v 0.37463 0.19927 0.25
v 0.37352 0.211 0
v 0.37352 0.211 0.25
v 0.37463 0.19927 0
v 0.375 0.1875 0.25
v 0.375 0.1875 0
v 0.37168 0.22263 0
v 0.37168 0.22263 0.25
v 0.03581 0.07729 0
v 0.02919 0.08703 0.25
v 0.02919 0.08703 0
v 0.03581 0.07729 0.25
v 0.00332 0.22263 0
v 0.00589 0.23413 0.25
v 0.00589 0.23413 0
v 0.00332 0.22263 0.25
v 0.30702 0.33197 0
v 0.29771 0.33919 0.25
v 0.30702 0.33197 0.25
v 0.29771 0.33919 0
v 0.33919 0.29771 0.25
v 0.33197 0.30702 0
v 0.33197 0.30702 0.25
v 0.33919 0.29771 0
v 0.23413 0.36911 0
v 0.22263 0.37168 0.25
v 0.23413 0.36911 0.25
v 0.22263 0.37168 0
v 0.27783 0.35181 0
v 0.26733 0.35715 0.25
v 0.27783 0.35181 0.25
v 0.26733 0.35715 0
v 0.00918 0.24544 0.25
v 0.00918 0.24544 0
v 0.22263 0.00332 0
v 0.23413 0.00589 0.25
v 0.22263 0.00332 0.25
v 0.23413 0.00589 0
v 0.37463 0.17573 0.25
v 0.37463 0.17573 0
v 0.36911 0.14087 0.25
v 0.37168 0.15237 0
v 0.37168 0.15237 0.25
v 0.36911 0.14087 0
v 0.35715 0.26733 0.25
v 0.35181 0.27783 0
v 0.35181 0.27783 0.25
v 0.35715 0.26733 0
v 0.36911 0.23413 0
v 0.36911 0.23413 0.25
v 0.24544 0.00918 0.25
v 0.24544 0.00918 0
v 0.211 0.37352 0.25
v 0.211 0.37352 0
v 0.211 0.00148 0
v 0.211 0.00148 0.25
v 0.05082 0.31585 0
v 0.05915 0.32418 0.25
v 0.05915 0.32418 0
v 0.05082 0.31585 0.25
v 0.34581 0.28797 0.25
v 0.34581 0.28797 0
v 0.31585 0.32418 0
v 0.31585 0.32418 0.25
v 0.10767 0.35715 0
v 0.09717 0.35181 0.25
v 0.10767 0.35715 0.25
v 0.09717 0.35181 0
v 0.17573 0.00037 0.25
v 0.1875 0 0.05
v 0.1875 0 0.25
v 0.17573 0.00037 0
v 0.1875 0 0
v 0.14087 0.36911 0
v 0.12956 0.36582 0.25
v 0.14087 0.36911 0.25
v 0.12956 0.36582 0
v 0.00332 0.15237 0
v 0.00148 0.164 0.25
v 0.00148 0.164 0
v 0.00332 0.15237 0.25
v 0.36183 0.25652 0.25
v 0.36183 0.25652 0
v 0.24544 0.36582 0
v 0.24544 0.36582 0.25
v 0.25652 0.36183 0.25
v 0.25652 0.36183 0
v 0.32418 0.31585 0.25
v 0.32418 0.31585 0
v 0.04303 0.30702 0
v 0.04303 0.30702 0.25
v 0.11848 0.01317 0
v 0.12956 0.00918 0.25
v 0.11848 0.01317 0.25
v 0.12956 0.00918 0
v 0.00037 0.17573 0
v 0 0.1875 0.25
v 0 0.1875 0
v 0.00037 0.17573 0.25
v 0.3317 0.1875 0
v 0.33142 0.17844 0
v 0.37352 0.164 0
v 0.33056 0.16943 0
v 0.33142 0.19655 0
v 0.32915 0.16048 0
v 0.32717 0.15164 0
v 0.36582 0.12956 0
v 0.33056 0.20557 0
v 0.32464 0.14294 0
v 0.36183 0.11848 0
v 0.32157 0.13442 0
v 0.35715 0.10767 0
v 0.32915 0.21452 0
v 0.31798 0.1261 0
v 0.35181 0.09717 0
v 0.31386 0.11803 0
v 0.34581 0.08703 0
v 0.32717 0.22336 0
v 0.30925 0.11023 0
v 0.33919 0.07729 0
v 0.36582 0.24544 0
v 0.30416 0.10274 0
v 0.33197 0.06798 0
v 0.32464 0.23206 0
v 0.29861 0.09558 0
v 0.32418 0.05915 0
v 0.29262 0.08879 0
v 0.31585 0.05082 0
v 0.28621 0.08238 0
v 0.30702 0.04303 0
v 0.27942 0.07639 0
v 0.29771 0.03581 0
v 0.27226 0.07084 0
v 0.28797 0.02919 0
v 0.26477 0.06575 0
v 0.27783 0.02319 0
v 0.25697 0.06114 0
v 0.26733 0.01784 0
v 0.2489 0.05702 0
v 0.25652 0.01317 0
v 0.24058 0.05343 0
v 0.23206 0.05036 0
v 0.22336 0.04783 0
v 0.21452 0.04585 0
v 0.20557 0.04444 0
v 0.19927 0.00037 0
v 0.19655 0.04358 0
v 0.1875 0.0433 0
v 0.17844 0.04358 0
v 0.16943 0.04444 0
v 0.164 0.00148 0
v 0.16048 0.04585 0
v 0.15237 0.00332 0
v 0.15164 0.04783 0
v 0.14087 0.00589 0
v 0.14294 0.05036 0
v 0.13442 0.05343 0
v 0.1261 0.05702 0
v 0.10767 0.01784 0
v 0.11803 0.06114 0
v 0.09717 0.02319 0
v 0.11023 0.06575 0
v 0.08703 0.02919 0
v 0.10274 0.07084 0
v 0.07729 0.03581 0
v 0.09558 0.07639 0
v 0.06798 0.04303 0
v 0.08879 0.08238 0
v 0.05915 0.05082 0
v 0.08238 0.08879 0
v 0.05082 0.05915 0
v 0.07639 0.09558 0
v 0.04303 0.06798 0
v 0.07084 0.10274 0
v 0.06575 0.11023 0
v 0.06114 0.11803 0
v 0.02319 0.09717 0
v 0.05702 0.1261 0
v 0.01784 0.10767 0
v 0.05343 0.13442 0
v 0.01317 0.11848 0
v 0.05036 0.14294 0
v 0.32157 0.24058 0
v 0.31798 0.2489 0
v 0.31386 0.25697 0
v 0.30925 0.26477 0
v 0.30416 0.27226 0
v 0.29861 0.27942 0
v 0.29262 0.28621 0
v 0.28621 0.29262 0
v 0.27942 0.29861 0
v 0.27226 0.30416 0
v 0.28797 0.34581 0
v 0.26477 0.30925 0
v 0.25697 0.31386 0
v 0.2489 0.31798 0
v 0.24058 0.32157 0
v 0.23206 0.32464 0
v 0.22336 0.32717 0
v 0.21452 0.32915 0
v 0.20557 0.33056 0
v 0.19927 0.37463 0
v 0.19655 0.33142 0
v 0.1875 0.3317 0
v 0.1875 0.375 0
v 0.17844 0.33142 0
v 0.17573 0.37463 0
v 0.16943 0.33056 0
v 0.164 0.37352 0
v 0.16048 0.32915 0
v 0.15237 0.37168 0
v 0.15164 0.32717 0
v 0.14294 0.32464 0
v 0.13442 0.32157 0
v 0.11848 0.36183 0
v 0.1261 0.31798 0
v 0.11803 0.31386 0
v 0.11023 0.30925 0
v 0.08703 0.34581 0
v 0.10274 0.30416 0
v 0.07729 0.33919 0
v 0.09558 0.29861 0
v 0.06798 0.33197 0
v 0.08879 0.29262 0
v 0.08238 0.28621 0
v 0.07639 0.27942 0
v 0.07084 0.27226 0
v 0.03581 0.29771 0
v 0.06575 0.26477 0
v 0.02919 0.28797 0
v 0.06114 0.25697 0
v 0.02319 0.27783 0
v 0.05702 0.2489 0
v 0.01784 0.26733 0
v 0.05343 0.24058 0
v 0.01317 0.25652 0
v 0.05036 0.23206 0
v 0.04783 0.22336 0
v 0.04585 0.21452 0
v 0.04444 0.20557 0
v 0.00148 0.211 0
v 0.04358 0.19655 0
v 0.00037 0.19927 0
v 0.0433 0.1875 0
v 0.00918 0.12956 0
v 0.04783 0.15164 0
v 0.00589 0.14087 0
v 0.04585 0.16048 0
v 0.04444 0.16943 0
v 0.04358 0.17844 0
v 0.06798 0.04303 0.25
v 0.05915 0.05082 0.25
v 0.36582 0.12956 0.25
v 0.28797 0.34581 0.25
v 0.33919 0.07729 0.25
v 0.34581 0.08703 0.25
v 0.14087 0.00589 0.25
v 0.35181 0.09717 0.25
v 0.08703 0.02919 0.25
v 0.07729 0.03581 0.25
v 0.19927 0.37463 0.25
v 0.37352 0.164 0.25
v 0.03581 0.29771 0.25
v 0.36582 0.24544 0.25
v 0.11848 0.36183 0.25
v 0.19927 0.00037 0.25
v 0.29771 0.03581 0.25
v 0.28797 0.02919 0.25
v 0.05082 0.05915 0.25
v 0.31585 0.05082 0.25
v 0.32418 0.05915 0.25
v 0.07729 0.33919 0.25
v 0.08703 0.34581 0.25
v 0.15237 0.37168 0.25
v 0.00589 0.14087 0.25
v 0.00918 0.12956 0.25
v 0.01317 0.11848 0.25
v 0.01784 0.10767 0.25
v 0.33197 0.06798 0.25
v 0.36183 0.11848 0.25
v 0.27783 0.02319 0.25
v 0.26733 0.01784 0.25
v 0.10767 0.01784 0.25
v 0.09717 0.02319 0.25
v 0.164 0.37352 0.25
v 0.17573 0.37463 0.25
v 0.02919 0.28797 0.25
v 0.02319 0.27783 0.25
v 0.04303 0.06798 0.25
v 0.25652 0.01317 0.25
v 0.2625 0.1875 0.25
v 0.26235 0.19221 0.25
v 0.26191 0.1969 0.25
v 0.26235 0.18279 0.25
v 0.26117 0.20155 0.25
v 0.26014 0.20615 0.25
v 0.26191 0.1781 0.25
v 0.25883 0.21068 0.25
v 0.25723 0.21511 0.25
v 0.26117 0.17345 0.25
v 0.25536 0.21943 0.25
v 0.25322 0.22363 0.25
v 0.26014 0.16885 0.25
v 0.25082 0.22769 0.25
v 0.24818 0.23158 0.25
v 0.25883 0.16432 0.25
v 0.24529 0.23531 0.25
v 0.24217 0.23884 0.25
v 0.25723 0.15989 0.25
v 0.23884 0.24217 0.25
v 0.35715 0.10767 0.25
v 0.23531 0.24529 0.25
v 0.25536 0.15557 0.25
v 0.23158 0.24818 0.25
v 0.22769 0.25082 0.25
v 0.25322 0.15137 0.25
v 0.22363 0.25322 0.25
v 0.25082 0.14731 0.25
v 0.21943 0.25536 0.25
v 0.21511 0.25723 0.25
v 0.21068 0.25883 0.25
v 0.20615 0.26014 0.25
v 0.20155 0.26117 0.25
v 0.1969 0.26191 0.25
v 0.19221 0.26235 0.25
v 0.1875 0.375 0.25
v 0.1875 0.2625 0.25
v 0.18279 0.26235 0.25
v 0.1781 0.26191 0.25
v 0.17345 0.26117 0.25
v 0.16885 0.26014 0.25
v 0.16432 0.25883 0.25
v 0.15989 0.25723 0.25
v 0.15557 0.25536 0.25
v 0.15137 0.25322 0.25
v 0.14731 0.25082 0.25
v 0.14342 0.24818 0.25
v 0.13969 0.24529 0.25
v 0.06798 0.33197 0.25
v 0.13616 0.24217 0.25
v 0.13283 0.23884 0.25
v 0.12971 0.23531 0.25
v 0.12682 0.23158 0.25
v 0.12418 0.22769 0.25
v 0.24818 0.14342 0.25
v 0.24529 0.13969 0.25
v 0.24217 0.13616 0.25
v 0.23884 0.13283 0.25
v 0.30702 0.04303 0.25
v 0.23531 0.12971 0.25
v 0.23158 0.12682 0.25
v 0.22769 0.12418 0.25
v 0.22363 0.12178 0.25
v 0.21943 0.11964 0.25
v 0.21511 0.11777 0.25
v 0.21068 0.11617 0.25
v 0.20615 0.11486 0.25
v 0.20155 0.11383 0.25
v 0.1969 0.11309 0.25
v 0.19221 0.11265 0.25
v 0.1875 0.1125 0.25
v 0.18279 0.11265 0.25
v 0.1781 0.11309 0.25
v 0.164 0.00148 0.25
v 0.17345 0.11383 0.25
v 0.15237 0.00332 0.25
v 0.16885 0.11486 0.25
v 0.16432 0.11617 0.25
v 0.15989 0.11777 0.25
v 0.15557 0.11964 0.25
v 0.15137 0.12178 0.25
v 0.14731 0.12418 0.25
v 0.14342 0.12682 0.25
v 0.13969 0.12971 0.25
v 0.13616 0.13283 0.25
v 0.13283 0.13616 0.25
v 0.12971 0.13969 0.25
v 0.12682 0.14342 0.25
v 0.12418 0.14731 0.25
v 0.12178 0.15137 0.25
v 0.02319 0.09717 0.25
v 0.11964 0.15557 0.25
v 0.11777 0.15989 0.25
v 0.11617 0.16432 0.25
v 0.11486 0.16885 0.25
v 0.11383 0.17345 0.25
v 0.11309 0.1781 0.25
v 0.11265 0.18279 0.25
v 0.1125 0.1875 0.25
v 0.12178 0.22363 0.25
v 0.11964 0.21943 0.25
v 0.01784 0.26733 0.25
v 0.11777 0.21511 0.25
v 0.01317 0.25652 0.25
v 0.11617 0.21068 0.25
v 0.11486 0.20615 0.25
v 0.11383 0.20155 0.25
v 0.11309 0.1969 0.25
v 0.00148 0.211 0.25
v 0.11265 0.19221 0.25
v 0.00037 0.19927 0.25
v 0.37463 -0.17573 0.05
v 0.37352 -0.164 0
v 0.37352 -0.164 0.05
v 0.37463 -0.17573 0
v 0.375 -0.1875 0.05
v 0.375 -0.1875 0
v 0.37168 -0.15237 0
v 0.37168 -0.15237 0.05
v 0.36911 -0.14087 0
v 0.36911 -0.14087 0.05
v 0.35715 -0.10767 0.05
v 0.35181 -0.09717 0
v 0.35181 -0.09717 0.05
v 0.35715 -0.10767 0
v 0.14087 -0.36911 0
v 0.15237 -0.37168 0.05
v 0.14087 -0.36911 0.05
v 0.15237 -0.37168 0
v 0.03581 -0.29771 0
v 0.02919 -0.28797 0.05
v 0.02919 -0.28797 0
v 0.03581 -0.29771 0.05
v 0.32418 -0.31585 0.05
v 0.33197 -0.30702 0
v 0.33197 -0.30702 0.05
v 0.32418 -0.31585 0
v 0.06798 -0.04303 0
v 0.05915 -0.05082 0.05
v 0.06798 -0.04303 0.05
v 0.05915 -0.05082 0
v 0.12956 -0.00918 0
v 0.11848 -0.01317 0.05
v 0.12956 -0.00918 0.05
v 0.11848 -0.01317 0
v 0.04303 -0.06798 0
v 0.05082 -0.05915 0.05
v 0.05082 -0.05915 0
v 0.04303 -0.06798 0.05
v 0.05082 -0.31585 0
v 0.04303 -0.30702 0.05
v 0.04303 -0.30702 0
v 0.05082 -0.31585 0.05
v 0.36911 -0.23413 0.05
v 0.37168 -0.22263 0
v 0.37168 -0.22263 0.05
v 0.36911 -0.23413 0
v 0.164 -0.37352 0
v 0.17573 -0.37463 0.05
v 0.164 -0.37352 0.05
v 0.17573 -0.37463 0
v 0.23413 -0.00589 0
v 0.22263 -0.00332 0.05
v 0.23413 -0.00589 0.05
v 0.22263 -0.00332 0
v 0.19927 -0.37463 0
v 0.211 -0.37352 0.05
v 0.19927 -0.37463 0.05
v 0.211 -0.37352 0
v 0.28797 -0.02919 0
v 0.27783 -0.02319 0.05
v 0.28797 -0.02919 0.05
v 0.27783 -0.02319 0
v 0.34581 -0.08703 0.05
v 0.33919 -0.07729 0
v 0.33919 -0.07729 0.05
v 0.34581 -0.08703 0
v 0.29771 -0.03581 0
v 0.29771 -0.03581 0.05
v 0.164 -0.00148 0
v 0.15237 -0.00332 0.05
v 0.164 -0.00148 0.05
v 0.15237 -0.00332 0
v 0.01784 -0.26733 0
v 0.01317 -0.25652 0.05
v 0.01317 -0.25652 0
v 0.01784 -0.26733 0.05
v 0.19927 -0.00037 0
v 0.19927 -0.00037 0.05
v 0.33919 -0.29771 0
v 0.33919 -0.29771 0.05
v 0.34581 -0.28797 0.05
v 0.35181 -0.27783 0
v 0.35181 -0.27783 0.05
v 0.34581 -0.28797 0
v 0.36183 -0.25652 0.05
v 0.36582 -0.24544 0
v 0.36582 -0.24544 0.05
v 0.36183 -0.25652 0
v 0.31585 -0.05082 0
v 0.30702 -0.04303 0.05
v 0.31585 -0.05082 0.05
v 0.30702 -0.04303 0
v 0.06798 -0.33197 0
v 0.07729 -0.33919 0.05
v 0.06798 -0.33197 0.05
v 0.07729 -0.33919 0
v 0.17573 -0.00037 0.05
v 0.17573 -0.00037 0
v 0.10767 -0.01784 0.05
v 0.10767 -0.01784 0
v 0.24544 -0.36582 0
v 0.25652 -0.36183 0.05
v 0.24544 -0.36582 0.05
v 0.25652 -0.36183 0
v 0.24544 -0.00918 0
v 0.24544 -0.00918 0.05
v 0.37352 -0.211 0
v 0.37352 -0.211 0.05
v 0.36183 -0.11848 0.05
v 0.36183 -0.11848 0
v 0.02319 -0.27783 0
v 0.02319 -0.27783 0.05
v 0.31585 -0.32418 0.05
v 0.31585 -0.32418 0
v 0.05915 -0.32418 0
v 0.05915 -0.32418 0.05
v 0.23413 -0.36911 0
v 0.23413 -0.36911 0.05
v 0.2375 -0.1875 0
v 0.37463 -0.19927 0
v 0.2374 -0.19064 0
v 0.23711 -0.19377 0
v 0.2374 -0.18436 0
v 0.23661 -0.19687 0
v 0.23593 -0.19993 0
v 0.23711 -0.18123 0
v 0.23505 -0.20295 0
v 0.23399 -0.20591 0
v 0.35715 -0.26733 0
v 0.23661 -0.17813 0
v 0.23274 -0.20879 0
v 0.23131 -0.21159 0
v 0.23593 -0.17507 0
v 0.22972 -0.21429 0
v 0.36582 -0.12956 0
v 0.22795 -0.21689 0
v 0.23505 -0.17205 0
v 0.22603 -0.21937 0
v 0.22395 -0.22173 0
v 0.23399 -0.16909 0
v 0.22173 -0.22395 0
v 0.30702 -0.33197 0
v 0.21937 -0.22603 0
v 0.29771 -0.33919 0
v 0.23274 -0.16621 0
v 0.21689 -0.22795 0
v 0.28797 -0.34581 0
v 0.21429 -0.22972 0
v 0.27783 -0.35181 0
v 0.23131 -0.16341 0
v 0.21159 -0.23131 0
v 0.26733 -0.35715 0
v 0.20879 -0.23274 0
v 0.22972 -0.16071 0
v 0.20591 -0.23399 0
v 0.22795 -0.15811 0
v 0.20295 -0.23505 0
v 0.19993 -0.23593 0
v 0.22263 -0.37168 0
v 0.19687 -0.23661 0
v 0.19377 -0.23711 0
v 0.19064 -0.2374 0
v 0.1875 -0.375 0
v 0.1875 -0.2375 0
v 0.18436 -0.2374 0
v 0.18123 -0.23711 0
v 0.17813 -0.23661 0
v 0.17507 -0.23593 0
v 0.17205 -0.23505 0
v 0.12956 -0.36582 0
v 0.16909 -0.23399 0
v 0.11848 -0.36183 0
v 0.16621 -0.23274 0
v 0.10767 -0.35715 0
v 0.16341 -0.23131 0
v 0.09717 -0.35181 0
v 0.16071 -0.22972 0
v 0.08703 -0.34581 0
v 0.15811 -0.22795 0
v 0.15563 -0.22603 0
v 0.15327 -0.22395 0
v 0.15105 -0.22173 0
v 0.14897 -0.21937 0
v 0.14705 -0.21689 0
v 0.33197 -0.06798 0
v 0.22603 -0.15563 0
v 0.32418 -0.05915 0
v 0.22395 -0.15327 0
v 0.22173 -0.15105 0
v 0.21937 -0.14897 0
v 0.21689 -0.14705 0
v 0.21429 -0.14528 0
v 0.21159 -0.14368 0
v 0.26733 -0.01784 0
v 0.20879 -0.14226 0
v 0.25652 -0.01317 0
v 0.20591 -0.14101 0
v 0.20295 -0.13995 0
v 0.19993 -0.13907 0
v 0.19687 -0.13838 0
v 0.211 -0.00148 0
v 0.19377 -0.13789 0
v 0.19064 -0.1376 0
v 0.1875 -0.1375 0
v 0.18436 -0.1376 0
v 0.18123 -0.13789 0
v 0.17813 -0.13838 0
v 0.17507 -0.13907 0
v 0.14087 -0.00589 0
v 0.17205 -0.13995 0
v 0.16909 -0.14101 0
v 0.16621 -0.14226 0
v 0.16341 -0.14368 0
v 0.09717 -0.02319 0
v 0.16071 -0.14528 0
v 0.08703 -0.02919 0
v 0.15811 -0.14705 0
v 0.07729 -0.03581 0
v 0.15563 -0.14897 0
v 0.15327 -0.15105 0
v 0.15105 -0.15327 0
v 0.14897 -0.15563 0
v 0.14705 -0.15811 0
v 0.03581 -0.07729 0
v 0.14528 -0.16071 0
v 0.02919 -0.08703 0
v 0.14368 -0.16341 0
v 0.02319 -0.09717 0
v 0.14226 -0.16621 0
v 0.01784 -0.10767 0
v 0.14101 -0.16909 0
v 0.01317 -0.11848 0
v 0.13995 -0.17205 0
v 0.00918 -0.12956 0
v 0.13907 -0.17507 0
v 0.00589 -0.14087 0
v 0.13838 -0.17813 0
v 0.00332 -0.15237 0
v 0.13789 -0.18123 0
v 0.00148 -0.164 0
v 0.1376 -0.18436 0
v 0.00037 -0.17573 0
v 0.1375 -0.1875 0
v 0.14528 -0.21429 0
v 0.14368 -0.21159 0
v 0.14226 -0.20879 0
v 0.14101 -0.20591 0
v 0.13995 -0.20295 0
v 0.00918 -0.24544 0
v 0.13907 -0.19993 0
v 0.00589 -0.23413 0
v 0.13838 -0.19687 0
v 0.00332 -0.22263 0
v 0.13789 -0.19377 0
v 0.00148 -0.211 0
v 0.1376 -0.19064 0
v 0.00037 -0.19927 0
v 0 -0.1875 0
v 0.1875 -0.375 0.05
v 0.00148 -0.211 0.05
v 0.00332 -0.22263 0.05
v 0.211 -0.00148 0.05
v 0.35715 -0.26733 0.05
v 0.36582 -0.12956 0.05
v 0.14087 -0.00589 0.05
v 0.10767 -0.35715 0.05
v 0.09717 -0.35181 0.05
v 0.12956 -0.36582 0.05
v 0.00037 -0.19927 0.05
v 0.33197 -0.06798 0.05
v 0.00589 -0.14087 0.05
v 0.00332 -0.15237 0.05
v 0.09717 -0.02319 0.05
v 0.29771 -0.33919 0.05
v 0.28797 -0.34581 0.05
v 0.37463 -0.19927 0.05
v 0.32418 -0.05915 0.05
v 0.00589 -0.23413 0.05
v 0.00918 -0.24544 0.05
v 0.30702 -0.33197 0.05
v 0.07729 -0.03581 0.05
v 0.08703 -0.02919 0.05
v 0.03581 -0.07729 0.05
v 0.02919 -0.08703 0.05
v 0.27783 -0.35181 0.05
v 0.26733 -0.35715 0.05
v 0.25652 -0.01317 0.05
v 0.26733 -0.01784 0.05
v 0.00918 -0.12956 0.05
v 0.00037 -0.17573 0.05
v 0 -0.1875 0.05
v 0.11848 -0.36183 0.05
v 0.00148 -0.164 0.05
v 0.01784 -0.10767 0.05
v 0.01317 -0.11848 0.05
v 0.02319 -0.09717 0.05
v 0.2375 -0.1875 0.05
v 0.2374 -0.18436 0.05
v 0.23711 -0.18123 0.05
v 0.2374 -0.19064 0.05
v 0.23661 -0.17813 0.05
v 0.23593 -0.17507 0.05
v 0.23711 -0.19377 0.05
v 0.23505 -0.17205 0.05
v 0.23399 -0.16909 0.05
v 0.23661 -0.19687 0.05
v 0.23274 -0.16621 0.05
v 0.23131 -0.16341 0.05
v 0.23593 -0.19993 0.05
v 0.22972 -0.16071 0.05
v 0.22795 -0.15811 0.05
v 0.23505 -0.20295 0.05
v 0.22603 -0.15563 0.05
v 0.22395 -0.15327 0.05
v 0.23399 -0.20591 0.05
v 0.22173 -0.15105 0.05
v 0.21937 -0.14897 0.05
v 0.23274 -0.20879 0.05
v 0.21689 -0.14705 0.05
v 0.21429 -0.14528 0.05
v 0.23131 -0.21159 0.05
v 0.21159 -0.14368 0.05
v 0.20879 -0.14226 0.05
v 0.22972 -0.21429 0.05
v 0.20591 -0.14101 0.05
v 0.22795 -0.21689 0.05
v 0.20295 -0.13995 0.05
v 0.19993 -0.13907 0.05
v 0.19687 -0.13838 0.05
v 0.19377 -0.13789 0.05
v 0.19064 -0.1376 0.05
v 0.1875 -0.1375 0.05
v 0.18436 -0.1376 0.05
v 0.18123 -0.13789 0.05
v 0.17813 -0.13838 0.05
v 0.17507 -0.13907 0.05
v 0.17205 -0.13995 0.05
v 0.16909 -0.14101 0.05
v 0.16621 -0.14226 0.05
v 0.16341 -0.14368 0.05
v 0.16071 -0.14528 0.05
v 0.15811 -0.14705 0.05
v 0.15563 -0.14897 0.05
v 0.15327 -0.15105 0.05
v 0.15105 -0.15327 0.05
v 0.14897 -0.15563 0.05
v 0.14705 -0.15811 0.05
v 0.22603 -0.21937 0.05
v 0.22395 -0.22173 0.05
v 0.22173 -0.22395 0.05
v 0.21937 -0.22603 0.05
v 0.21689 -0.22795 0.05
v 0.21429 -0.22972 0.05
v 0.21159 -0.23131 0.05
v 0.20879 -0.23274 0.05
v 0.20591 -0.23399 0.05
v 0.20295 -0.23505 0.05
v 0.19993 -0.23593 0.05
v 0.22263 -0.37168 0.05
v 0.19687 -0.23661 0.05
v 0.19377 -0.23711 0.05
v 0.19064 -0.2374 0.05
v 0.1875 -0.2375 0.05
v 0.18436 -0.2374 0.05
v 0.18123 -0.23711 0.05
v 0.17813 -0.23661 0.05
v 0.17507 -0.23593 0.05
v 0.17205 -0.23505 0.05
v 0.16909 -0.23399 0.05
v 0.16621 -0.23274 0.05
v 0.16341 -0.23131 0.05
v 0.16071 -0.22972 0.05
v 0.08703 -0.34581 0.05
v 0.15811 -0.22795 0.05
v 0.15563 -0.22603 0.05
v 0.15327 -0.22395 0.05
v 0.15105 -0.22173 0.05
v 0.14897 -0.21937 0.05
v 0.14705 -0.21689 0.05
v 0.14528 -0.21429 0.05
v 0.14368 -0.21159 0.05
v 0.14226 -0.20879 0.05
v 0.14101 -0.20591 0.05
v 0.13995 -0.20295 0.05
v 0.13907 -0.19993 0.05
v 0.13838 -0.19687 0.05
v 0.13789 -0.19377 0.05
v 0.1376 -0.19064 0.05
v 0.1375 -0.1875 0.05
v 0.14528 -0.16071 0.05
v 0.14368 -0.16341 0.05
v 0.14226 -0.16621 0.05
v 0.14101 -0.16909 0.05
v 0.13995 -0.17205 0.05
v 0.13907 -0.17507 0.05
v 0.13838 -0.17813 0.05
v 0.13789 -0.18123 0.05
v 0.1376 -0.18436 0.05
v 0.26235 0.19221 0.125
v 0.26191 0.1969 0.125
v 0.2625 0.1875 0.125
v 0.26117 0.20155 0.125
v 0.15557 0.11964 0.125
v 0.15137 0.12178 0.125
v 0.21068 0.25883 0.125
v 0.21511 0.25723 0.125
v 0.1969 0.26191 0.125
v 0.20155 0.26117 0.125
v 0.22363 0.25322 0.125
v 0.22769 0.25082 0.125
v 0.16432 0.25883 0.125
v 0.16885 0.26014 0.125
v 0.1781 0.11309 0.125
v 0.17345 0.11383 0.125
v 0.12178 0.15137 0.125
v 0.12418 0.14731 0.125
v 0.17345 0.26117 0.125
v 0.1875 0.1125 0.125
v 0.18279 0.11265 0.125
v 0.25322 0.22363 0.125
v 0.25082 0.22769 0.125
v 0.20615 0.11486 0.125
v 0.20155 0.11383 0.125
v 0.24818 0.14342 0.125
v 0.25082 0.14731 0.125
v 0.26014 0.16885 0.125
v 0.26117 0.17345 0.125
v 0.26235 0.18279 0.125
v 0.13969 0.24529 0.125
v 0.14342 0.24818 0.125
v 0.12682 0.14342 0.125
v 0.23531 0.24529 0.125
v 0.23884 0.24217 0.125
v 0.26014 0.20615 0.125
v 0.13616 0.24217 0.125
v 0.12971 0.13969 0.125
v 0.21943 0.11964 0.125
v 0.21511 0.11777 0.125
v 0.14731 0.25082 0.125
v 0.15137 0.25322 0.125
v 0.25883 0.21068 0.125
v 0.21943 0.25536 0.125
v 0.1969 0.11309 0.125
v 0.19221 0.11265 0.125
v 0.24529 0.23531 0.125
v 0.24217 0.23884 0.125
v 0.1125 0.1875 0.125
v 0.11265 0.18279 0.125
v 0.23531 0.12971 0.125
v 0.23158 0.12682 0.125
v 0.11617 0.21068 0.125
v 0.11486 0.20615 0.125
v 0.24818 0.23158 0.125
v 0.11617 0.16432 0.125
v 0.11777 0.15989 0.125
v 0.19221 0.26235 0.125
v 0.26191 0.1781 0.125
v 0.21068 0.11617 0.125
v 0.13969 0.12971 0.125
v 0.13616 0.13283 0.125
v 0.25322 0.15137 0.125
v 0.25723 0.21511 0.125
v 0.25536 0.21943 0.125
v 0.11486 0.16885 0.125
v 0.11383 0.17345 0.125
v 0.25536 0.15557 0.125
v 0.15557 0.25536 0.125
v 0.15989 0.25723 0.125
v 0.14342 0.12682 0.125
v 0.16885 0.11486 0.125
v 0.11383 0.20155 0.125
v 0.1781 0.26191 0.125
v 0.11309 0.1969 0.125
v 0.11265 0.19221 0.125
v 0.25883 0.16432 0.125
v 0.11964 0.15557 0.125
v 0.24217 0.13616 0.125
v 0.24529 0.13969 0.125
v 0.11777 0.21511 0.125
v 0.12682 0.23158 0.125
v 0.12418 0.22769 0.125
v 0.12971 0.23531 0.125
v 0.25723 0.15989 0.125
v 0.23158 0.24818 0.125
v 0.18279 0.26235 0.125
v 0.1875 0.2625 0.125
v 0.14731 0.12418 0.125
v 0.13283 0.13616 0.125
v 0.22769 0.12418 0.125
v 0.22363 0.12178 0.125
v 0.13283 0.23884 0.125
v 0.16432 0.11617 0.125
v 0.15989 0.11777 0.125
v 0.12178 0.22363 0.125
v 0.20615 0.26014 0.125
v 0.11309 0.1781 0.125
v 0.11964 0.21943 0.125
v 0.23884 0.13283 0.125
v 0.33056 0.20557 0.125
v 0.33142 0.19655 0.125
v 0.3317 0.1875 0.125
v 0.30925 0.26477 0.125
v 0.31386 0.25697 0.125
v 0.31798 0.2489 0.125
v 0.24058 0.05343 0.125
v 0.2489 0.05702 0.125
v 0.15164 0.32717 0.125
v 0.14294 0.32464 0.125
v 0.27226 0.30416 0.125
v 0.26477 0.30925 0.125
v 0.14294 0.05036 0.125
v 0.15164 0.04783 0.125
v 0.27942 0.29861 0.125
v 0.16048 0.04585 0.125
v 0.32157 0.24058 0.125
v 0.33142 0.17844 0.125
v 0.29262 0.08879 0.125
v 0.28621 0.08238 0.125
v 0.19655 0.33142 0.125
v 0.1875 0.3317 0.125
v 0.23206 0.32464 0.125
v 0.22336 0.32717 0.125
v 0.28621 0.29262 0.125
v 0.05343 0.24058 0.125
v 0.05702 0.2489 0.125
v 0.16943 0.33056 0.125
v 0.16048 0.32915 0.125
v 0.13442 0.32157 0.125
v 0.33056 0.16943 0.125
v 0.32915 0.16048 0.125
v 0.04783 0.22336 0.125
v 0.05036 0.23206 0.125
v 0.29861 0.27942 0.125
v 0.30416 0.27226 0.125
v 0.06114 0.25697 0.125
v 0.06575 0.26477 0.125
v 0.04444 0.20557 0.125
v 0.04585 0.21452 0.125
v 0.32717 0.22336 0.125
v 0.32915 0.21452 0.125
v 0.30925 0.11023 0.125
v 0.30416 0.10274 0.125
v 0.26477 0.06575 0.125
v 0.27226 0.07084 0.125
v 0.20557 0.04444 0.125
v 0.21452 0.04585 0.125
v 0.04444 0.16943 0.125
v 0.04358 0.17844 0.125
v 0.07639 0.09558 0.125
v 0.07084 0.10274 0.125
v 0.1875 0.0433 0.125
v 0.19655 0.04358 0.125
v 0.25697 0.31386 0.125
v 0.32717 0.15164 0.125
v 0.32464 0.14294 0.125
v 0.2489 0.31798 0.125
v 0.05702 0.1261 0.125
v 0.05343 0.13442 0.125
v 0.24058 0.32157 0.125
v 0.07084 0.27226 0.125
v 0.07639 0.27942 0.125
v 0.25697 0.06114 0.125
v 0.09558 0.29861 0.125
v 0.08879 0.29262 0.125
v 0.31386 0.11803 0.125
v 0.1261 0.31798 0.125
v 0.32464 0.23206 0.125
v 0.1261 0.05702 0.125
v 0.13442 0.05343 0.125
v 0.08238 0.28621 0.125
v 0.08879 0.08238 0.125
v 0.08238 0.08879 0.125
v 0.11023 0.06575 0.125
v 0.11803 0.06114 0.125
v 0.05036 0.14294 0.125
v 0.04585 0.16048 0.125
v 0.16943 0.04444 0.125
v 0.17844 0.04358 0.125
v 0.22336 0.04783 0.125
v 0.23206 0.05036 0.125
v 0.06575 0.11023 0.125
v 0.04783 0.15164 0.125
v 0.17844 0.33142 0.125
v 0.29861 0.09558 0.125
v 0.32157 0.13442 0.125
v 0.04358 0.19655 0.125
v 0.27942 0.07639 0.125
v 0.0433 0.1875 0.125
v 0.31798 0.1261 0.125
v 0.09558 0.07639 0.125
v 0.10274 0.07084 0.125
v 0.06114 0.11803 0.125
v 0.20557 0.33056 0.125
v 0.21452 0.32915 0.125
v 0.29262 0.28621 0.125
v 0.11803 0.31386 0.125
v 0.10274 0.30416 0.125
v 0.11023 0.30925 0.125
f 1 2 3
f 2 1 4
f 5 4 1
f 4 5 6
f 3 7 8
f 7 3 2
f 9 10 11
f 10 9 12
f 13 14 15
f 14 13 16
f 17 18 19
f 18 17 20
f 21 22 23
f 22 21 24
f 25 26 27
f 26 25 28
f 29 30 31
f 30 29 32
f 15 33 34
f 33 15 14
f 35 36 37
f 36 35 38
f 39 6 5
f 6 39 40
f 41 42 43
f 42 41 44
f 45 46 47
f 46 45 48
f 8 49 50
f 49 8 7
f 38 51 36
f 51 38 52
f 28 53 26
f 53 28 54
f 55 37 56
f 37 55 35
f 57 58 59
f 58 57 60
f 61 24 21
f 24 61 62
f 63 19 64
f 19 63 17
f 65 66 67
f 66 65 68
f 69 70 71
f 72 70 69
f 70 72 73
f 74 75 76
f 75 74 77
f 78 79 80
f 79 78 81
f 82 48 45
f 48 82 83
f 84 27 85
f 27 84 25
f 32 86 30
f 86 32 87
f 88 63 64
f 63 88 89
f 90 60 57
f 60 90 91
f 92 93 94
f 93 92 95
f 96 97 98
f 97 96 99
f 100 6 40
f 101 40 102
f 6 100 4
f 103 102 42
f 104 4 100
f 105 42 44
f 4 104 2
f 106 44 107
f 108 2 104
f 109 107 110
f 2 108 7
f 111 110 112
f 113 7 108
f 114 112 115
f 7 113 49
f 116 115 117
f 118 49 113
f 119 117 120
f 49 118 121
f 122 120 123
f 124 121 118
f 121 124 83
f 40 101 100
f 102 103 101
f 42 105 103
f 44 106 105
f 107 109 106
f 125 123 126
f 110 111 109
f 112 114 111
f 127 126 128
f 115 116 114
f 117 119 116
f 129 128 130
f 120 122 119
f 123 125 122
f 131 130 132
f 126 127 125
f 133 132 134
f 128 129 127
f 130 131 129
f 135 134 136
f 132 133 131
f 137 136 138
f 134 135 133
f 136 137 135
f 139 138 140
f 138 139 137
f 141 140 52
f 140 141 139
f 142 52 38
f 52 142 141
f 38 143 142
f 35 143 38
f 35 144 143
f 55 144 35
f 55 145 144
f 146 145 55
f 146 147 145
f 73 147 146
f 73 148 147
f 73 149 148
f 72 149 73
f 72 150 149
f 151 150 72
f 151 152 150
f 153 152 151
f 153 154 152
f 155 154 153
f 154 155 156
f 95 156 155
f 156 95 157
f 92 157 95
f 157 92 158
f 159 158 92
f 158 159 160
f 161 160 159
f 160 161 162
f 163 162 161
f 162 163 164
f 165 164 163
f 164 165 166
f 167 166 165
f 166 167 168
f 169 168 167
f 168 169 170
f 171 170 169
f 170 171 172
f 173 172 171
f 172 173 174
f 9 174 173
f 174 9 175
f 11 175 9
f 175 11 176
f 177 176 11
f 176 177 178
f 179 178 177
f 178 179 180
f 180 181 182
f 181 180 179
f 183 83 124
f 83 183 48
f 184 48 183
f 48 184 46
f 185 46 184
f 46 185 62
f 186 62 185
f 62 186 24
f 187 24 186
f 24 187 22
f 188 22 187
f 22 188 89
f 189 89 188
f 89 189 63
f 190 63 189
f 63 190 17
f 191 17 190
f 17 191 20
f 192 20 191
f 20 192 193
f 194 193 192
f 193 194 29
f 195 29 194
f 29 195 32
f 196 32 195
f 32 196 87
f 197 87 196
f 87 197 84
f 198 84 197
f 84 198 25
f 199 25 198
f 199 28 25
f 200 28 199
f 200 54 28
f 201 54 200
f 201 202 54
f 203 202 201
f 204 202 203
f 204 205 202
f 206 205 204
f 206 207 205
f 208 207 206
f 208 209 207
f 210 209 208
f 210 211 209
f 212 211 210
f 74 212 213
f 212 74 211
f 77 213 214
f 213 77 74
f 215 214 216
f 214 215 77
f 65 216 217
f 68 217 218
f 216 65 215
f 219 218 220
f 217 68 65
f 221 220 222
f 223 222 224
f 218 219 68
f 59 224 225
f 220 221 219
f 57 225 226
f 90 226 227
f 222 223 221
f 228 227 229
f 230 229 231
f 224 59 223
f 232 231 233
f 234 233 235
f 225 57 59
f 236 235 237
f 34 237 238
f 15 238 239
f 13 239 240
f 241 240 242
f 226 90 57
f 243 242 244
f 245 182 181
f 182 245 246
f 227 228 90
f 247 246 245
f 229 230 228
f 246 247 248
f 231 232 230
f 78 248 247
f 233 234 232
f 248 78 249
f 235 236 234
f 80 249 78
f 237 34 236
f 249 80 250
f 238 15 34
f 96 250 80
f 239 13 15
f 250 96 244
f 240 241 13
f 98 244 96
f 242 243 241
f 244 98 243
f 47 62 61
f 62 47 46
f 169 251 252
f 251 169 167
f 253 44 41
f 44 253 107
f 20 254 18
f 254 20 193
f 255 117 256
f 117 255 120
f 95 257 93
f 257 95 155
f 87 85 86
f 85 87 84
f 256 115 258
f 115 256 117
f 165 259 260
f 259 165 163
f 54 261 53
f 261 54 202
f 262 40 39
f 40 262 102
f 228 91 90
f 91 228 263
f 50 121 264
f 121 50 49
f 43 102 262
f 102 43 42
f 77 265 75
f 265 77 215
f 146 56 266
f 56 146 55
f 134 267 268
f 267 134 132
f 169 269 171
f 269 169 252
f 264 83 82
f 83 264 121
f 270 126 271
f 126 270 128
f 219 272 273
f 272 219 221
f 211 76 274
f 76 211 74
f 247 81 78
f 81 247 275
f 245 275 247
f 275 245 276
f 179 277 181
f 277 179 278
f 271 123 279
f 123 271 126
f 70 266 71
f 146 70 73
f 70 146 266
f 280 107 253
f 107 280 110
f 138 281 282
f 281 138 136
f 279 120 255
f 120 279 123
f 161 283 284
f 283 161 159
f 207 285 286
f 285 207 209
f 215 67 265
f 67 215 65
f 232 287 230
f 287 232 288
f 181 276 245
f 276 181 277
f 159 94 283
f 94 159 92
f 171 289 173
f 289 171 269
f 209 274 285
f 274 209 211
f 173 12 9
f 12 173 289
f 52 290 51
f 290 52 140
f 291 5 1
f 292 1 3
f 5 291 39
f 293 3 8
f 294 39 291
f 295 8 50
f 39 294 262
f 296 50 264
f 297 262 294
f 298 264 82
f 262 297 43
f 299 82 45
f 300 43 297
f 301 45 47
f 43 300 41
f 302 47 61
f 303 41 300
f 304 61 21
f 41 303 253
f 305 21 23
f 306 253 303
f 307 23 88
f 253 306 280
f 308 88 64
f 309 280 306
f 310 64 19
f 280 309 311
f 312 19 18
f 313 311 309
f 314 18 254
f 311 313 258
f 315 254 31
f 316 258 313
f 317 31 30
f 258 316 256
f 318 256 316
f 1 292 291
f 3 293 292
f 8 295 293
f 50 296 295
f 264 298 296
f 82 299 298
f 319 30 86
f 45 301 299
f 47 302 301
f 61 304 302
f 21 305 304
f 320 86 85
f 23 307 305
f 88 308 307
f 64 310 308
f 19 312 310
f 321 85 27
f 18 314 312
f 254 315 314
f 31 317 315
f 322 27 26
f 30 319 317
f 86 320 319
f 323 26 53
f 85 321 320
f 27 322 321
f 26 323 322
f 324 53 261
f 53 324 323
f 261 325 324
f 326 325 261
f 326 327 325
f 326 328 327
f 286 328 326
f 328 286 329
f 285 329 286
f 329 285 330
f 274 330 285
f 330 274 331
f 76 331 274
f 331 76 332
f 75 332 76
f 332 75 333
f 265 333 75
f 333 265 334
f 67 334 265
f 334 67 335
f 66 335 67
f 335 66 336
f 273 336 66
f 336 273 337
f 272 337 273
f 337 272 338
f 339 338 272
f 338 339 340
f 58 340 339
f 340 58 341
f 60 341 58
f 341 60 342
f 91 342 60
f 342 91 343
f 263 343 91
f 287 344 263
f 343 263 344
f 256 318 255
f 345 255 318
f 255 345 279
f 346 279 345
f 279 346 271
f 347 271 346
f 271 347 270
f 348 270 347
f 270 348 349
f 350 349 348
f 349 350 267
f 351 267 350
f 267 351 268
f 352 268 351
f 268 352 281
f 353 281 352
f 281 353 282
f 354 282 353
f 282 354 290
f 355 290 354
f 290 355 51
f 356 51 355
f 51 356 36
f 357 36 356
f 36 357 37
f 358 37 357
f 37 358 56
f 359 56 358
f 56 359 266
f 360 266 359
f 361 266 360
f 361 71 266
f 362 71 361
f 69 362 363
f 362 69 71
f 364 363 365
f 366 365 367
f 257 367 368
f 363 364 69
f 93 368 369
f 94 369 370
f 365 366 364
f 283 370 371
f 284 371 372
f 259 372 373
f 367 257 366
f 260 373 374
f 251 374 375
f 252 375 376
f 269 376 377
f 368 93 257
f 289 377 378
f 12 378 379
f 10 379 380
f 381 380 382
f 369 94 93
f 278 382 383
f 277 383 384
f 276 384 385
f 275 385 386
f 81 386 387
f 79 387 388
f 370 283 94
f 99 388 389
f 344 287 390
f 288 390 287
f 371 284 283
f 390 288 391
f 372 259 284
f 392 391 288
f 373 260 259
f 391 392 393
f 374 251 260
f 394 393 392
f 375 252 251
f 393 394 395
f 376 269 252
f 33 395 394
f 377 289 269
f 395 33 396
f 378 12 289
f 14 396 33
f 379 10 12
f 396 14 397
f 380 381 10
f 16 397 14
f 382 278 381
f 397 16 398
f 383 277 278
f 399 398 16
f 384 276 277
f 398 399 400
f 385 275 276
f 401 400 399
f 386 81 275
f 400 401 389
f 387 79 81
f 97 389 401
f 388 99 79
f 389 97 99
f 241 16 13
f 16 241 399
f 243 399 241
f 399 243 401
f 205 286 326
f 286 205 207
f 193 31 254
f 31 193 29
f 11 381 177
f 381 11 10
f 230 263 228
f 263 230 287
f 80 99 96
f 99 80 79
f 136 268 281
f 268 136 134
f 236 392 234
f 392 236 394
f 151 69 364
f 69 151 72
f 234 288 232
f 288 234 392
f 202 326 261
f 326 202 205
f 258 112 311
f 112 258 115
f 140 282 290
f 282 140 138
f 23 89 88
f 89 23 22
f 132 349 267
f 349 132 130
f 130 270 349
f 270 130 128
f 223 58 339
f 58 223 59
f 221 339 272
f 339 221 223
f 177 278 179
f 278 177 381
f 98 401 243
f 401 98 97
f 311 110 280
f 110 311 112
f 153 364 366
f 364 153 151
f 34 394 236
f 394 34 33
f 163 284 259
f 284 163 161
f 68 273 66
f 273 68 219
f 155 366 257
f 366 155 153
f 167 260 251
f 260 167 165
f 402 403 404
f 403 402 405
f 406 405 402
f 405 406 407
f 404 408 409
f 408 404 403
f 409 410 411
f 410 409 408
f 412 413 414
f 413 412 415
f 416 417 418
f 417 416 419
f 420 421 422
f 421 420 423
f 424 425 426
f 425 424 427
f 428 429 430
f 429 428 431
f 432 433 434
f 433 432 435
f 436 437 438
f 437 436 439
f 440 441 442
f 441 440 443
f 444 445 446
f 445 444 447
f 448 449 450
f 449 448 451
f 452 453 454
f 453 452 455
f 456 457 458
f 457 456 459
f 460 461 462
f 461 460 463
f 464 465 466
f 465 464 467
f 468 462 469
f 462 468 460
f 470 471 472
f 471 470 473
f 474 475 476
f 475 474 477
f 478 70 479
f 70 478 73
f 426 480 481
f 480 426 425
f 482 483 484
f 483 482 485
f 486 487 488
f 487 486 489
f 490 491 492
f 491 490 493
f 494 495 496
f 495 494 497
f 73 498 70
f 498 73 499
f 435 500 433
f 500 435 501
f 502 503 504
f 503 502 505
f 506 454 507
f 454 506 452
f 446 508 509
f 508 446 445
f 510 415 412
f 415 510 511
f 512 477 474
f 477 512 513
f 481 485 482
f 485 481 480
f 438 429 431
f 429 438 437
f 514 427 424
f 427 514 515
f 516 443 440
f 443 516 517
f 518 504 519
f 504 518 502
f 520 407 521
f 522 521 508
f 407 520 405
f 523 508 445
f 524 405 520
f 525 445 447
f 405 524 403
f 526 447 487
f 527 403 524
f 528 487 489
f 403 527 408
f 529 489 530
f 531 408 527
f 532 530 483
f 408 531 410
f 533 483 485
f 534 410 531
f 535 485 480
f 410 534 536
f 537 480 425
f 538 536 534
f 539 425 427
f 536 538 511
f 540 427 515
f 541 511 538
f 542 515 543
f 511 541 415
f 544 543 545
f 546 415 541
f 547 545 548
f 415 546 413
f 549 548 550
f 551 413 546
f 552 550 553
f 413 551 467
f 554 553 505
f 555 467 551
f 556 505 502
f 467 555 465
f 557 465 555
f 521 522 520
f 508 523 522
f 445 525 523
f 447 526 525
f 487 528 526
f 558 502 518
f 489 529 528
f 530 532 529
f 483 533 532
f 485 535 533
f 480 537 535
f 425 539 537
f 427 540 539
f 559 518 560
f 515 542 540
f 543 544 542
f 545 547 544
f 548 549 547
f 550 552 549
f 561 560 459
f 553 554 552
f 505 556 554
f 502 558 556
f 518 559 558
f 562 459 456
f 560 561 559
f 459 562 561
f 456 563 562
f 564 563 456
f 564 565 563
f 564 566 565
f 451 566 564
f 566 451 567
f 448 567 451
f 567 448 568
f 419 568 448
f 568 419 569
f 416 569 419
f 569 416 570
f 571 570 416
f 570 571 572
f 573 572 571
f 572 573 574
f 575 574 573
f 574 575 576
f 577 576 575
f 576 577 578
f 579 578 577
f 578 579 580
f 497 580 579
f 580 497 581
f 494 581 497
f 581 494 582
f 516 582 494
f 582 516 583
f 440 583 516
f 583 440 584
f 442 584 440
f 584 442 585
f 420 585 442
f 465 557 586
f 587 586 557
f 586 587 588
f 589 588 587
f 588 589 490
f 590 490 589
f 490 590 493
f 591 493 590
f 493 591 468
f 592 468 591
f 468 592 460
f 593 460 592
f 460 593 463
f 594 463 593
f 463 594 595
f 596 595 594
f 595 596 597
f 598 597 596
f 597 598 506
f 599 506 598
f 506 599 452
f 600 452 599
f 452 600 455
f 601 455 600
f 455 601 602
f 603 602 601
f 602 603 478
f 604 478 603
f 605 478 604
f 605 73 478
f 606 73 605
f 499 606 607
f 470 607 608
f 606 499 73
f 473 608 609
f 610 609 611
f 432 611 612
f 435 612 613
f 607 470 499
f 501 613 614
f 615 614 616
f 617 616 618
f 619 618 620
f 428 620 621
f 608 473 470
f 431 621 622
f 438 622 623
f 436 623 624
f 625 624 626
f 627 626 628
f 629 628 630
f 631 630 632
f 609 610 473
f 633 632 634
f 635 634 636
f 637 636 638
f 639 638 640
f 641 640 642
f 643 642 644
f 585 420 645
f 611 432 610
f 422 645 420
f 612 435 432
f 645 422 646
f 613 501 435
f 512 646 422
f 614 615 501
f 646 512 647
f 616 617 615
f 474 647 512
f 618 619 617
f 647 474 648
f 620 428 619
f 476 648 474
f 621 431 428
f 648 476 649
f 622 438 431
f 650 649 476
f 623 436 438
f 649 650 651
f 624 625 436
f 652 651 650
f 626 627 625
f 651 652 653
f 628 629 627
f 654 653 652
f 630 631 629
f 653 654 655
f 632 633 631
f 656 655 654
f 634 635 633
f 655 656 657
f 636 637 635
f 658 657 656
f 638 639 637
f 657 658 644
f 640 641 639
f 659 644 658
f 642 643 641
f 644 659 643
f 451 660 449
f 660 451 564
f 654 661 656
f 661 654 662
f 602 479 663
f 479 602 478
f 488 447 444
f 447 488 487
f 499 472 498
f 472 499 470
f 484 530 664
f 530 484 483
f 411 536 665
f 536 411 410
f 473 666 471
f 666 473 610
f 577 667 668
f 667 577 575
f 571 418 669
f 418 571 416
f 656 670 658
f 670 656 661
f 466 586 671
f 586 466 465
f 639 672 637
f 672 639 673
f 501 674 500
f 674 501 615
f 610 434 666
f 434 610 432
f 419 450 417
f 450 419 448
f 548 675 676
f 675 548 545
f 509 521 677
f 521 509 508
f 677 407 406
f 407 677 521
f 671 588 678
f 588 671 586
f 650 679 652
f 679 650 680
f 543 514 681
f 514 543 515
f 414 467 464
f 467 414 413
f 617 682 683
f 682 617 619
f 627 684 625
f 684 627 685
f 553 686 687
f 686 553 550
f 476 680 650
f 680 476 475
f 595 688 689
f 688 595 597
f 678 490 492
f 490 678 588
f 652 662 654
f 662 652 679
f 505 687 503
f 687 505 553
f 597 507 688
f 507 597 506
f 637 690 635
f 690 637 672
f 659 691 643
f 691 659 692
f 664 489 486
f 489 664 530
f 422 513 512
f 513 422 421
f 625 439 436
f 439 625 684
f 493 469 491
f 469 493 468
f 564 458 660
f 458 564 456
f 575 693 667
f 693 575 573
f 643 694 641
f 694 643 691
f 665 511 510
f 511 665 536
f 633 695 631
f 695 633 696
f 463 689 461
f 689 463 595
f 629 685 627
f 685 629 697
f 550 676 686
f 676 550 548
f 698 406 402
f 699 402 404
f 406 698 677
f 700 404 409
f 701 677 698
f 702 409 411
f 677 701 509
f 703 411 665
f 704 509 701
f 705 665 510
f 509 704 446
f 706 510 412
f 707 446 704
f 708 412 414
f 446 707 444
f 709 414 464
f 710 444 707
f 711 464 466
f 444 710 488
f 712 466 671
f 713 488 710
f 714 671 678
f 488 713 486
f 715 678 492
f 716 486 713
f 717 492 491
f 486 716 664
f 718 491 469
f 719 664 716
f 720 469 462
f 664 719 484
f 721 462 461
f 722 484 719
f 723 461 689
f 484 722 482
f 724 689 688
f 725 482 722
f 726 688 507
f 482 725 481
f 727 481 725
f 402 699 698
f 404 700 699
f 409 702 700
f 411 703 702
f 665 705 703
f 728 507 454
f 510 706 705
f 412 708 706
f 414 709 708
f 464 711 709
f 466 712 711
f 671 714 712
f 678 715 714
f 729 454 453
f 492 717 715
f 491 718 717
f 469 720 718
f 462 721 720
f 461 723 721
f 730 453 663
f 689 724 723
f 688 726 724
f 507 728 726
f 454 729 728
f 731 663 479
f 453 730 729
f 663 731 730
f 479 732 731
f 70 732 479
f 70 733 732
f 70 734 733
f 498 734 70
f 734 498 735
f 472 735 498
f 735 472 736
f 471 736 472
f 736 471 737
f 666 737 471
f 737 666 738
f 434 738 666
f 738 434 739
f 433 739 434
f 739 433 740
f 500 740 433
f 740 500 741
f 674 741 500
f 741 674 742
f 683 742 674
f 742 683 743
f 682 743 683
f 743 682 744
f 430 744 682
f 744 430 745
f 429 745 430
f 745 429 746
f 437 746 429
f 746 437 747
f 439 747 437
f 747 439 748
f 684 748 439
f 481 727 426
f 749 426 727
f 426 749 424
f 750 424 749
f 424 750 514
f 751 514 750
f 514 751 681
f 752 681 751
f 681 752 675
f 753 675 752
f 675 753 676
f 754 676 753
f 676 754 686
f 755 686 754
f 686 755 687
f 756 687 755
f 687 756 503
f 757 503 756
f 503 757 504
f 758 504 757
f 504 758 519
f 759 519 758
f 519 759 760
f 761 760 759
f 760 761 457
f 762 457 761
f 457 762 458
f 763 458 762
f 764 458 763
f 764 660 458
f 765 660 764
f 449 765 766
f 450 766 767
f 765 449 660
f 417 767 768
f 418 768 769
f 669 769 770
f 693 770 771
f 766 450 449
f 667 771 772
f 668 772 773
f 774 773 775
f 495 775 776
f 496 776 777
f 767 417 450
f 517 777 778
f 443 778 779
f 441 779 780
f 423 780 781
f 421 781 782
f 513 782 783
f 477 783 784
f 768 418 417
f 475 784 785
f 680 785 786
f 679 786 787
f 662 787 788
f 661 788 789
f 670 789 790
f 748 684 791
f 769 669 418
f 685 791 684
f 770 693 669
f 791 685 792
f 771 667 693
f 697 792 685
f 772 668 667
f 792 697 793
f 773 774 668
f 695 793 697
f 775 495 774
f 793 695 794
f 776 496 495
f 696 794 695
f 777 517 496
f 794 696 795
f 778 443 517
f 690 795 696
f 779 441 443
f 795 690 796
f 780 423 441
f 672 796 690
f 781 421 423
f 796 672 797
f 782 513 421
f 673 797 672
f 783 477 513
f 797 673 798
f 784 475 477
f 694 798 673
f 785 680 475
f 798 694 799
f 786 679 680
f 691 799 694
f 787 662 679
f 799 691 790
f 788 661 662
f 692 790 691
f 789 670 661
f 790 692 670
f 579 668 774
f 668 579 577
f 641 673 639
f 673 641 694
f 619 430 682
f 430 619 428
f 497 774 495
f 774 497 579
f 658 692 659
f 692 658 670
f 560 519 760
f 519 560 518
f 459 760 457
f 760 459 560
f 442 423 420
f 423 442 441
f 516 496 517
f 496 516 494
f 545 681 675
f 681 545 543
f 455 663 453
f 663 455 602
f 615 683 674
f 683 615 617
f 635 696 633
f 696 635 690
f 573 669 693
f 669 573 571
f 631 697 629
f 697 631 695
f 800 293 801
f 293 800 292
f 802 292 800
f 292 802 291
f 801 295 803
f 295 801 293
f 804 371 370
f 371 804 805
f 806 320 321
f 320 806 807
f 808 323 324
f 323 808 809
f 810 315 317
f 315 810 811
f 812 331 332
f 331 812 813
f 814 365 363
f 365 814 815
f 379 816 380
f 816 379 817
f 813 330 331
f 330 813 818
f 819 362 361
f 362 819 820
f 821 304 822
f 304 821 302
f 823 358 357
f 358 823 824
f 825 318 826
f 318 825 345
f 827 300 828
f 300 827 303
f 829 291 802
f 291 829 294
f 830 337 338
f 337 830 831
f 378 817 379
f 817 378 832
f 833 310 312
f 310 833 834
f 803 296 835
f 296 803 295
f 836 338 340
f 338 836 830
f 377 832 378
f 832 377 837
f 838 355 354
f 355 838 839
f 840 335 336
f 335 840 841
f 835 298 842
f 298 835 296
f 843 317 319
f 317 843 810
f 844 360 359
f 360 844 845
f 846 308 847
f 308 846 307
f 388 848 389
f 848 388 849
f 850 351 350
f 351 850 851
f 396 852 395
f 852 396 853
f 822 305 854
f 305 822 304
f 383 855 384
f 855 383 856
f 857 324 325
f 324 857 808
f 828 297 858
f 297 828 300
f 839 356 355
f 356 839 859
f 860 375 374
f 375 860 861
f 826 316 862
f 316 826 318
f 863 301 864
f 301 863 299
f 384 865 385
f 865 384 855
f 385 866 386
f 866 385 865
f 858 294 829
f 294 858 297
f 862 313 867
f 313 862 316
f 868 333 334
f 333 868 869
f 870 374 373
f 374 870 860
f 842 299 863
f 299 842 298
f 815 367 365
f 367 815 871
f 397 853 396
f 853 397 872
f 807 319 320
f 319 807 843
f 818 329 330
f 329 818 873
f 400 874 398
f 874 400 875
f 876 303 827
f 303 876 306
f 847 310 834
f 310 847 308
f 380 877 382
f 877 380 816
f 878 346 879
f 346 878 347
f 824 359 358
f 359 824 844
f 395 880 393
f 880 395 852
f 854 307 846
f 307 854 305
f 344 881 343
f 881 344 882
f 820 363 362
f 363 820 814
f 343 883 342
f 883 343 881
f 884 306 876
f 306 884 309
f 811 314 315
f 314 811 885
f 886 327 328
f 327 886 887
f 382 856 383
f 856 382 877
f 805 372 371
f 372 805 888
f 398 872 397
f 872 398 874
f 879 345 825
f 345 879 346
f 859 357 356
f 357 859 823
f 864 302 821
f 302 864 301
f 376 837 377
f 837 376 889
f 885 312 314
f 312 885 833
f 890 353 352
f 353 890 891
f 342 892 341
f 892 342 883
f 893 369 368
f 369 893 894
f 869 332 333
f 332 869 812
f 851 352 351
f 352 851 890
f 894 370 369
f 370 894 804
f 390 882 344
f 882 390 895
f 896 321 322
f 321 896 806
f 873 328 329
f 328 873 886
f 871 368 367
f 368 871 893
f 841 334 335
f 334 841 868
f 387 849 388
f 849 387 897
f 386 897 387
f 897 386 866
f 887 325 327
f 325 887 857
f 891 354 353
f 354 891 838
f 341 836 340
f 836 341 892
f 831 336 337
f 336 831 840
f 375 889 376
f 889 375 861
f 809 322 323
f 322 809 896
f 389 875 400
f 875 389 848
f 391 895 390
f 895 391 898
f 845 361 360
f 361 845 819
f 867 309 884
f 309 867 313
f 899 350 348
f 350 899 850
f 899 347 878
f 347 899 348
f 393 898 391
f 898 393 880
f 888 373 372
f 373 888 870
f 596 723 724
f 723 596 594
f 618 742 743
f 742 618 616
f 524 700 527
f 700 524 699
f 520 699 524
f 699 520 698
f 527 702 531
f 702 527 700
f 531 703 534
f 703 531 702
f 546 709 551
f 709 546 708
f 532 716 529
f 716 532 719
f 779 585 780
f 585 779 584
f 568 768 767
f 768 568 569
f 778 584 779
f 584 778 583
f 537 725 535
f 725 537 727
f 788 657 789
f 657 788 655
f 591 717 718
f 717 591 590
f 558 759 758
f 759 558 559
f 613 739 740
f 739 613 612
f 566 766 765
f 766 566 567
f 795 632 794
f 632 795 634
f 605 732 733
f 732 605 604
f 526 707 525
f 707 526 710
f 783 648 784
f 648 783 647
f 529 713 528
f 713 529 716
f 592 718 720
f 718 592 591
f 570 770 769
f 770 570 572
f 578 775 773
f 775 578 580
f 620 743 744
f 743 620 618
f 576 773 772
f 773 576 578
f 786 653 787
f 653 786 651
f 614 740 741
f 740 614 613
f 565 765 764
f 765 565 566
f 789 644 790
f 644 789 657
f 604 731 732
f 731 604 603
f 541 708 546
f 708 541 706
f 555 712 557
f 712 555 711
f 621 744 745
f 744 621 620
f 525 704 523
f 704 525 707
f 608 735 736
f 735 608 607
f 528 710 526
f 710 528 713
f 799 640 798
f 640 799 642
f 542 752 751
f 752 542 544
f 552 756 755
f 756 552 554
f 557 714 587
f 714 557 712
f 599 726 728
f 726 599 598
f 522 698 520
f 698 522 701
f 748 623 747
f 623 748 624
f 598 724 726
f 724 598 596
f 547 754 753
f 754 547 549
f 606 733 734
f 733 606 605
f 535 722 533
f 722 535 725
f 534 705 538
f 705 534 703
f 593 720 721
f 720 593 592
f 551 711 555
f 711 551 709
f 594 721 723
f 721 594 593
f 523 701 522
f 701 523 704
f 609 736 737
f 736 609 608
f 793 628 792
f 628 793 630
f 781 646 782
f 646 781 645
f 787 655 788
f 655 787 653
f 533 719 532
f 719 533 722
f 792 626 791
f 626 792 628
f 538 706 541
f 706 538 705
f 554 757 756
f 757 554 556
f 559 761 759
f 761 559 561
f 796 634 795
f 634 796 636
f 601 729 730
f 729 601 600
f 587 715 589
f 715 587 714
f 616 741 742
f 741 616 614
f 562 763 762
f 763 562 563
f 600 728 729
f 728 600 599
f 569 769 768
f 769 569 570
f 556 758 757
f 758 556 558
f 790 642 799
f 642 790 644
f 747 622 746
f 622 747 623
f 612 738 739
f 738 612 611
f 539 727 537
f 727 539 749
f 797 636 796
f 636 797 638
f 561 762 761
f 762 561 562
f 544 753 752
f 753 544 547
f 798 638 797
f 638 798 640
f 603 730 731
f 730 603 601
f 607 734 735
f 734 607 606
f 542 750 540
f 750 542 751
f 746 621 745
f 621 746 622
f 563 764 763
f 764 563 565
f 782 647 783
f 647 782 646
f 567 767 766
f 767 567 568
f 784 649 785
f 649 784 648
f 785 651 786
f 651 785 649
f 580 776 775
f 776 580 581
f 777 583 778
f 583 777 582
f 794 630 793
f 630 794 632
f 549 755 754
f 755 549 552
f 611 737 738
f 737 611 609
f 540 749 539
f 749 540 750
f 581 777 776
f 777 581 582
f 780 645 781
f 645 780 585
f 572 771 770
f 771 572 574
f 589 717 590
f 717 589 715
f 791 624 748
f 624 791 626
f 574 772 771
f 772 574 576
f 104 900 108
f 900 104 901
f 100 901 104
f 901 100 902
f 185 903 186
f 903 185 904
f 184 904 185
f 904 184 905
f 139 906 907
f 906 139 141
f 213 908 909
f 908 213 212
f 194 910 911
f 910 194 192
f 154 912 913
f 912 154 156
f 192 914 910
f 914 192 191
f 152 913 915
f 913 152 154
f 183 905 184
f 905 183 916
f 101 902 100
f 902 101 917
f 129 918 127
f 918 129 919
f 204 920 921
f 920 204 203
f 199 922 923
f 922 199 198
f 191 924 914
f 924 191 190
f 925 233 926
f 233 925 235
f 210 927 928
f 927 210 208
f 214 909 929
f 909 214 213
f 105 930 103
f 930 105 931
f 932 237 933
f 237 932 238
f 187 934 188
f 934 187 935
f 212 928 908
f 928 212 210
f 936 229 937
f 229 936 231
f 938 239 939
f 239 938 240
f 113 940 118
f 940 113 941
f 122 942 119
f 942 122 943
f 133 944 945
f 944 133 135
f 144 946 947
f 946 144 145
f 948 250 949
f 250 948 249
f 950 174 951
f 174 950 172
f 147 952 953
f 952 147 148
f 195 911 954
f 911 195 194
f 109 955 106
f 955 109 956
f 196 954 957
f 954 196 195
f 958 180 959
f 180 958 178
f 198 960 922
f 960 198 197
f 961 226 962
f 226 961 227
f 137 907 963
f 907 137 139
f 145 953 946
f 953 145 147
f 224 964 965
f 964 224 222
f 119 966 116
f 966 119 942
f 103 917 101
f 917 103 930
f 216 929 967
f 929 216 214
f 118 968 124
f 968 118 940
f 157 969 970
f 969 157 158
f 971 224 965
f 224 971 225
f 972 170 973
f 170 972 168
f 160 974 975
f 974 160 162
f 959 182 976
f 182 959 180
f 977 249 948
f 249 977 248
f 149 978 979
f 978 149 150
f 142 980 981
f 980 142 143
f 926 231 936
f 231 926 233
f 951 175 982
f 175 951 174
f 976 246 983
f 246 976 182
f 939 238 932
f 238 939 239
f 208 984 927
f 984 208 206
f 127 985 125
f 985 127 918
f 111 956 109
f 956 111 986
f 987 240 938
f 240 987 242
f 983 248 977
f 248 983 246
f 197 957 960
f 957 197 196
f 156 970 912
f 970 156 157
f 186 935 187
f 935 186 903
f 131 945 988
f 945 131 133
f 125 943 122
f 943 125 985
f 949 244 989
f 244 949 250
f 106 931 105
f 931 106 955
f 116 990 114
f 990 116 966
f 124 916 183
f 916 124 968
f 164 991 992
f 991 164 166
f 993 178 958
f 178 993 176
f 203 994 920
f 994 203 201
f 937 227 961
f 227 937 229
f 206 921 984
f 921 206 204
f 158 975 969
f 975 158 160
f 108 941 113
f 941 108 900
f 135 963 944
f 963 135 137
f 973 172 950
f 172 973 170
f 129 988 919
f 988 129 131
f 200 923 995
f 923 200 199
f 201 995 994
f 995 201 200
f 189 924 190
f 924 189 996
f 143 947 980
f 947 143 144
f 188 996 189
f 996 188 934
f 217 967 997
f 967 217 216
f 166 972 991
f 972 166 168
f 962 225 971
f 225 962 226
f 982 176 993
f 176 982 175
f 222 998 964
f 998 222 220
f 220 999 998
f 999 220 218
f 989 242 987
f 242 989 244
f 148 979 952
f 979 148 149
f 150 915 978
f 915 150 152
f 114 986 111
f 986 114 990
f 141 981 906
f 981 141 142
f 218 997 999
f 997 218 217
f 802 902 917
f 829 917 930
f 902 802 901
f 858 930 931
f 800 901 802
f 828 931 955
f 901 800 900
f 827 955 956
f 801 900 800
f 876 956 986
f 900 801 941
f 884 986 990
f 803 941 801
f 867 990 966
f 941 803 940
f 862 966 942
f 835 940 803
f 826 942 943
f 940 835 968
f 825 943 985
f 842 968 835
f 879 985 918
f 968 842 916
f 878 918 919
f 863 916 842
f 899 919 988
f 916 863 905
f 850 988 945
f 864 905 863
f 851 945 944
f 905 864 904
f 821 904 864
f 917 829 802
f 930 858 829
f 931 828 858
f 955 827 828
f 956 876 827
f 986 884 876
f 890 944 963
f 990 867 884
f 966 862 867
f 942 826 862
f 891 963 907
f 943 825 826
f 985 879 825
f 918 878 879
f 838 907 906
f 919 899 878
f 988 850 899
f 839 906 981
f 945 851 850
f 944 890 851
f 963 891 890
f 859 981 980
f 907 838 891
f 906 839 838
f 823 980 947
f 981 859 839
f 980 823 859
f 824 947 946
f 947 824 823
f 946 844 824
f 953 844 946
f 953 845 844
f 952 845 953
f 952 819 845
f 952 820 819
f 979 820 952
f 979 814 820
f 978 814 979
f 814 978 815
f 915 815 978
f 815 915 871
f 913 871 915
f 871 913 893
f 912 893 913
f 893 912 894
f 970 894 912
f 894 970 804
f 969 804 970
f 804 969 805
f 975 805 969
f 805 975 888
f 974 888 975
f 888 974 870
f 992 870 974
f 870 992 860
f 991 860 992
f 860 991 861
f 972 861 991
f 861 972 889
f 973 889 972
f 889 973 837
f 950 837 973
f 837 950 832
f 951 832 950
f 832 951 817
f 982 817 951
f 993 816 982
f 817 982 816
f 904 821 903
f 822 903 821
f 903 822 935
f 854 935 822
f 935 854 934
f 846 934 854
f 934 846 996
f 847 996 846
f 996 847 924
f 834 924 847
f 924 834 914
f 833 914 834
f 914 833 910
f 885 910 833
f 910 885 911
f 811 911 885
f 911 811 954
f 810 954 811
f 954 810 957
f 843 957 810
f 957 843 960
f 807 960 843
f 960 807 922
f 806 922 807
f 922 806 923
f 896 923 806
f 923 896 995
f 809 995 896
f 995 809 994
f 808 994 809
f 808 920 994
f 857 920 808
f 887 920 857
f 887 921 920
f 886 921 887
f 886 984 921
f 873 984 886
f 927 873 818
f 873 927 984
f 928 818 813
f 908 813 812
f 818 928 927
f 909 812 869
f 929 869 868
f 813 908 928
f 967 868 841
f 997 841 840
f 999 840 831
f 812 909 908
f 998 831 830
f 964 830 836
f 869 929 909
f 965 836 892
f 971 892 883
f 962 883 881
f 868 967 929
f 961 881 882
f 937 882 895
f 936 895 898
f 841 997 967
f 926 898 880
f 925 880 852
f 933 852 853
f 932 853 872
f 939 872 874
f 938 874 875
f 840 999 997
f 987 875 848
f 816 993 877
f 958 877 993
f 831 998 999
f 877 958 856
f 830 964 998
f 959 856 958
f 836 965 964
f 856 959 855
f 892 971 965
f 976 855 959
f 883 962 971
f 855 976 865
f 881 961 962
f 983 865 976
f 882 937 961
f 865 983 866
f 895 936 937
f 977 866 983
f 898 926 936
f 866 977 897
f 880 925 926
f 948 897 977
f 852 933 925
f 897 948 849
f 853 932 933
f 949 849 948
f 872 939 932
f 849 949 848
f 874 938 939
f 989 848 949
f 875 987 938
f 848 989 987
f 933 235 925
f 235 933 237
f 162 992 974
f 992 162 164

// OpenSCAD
// === Parameters ===
$fn = 100;

// Main reference dimensions
ref_length = 0.375;       // X span
ref_width  = 0.375;       // Y span
ref_height = 0.25;        // Z span / main extrusion depth

// Main annular cylinder
main_cx      = 0.1875;    // Center X (from left edge)
main_cy      = 0.1875;    // Center Y (from front edge)
main_outer_r = 0.1875;    // Outer radius
main_bore_r  = 0.075;     // Central through-bore radius
main_h       = 0.25;      // Full height
// Radial wall = 0.1875 - 0.075 = 0.1125

// Shallow attached annular tab
tab_cx      = 0.1875;     // Center X
tab_cy      = -0.1875;    // Center Y (extends in -Y direction)
tab_outer_r = 0.1875;     // Outer radius
tab_bore_r  = 0.05;       // Centered through-opening radius
tab_h       = 0.05;       // Tab height (lower than main sleeve)
// Radial wall = 0.1875 - 0.05 = 0.1375

// Underside recess / counterbore (from base upward)
recess_cx = 0.1875;       // Same center as main bore
recess_cy = 0.1875;
recess_r  = 0.1442;       // Counterbore radius (derived from 0.2884/2 bounding footprint)
recess_h  = 0.125;        // Depth from z=0 upward to z=0.125

// Boolean clearance
eps = 0.001;

// === Helper Modules ===

// Annular cylinder: solid cylinder with a concentric through hole
module annular_cylinder(cx, cy, h, r_outer, r_bore) {
    translate([cx, cy, 0])
        difference() {
            cylinder(h = h, r = r_outer);
            translate([0, 0, -eps])
                cylinder(h = h + 2 * eps, r = r_bore);
        }
}

// === Main Model Assembly ===
difference() {
    // Step 1: Union of positive bodies
    union() {
        // Main annular cylinder (full-height sleeve)
        translate([main_cx, main_cy, 0])
            cylinder(h = main_h, r = main_outer_r);

        // Shallow attached annular tab (tangent to main at Y=0)
        translate([tab_cx, tab_cy, 0])
            cylinder(h = tab_h, r = tab_outer_r);
    }

    // Step 2: Main central through bore (radius 0.075, full height)
    translate([main_cx, main_cy, -eps])
        cylinder(h = main_h + 2 * eps, r = main_bore_r);

    // Step 3: Tab centered through opening (radius 0.05, tab height)
    translate([tab_cx, tab_cy, -eps])
        cylinder(h = tab_h + 2 * eps, r = tab_bore_r);

    // Step 4: Underside recess / counterbore from base
    // Enlarges bore from radius 0.075 to 0.1442 in the lower half (z=0 to z=0.125)
    // Bounding footprint ~0.2557 x 0.2884, offsets L 0.0597, R 0.0596, F 0.0433, B 0.0433
    translate([recess_cx, recess_cy, -eps])
        cylinder(h = recess_h + eps, r = recess_r);
}
